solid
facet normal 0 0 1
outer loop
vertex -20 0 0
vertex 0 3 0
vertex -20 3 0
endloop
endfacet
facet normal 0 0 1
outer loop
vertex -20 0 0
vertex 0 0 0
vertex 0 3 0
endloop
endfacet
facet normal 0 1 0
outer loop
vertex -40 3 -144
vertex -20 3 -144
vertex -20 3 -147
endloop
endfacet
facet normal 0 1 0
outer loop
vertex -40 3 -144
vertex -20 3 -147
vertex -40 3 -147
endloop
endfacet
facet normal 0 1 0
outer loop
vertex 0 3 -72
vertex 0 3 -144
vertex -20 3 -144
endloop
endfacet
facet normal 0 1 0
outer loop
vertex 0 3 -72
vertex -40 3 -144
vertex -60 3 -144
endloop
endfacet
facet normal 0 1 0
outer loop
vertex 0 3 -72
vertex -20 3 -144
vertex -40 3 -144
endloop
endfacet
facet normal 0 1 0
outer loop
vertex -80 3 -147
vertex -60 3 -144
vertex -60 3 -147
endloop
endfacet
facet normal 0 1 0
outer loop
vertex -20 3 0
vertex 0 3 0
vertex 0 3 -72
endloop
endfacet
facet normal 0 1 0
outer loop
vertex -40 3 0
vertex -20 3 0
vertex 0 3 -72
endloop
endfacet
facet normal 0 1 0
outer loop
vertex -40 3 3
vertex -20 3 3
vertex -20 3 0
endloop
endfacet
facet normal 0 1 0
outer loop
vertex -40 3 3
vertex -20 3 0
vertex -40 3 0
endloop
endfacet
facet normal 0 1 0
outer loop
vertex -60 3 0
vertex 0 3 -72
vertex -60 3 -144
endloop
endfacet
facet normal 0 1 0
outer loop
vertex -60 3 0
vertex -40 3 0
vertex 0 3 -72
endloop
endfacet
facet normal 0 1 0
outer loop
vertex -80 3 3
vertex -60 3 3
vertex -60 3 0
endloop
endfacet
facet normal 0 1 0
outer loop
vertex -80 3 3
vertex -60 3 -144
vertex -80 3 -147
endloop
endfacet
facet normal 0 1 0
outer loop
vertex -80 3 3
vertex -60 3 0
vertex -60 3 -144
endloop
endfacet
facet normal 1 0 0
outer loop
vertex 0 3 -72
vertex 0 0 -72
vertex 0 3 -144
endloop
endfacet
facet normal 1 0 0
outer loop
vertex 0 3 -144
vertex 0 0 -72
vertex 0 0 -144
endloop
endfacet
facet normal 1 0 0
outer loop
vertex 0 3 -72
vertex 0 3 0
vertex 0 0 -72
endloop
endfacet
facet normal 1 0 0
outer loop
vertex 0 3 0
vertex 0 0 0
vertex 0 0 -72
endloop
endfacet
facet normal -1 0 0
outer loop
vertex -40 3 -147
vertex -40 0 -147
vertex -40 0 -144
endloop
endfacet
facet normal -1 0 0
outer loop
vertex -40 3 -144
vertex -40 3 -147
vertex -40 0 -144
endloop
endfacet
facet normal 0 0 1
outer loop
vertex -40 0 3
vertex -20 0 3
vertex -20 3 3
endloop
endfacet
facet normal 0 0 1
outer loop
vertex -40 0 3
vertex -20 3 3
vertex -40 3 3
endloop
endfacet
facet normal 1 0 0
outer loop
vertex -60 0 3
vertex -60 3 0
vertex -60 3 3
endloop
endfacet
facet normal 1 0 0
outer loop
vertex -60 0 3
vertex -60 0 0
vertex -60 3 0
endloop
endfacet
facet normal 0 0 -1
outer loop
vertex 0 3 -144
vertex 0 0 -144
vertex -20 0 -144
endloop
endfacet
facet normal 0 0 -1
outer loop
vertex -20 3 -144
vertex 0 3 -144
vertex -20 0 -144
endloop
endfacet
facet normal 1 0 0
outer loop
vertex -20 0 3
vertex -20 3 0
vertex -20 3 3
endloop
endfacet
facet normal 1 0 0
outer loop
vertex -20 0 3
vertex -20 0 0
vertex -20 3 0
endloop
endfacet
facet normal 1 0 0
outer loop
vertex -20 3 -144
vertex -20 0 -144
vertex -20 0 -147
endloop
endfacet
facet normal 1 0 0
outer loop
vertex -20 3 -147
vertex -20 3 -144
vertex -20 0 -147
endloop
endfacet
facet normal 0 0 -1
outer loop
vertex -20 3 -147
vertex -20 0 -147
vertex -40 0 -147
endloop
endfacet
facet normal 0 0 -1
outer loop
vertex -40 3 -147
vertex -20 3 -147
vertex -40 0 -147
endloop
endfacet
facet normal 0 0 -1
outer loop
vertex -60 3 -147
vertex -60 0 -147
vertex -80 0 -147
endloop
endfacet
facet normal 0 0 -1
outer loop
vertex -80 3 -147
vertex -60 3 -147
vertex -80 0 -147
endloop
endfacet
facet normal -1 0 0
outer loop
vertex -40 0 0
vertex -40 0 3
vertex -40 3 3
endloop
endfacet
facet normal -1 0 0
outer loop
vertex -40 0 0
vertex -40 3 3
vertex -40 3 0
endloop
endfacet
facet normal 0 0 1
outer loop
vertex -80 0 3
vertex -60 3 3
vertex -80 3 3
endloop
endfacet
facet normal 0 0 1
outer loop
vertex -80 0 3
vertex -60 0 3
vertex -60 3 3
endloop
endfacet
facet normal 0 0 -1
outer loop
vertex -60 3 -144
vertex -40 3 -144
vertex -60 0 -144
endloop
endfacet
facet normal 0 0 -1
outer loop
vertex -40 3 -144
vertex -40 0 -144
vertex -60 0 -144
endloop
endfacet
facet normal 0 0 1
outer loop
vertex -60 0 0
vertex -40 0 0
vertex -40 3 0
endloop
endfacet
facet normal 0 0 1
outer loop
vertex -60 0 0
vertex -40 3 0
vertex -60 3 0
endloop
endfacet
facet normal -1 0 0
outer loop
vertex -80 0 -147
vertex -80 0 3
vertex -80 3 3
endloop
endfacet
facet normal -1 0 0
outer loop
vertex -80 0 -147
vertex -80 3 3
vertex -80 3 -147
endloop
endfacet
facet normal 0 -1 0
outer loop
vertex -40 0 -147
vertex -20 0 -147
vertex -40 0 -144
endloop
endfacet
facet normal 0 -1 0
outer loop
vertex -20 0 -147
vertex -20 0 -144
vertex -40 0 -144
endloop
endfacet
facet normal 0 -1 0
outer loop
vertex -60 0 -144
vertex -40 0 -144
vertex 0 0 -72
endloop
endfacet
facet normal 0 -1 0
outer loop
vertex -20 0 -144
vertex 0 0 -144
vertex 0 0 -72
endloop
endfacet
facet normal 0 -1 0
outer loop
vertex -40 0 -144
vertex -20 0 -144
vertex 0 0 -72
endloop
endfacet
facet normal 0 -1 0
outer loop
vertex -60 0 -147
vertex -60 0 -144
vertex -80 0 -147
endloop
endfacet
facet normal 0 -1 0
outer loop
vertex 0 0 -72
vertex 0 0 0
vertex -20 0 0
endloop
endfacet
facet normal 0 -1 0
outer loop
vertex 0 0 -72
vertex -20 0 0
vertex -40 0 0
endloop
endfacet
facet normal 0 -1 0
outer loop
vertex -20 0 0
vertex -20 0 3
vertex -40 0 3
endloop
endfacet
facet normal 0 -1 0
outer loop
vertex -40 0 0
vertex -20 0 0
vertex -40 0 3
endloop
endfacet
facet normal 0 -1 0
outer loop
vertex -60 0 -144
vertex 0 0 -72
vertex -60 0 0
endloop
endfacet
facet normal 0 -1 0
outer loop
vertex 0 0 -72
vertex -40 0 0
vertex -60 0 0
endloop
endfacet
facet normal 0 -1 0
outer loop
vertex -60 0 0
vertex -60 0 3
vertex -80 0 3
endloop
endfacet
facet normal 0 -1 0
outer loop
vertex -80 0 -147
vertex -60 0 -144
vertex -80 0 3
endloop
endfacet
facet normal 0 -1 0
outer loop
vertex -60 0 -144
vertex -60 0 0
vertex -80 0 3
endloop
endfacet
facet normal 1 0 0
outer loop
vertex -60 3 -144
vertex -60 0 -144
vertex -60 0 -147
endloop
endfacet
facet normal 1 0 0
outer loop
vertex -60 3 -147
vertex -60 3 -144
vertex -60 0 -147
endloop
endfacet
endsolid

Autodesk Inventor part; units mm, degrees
ref_plane "YZ Plane" through (0, 0, 0) normal (1, 0, 0) x (0, 1, 0)
ref_plane "XZ Plane" through (0, 0, 0) normal (0, 1, 0) x (-1, 0, 0)
ref_plane "XY Plane" through (0, 0, 0) normal (0, 0, 1) x (1, 0, 0)
sketch "Sketch1" plane through (0, 0, 0) normal (0, 1, 0) x (-1, 0, 0)
  line L0 (0, 0) -> (0, -144)
  line L1 (0, 0) -> (20, 0)
  line L2 (20, 0) -> (20, 3)
  line L3 (20, 3) -> (40, 3)
  line L4 (40, 3) -> (40, 0)
  line L5 (40, 0) -> (60, 0)
  line L6 (60, 0) -> (60, 3)
  line L7 (60, 3) -> (80, 3)
  line L8 (0, -72) -> (20, -72)
  line L9 (0, -144) -> (20, -144)
  line L10 (20, -144) -> (20, -147)
  line L11 (20, -147) -> (40, -147)
  line L12 (40, -147) -> (40, -144)
  line L13 (40, -144) -> (60, -144)
  line L14 (60, -144) -> (60, -147)
  line L15 (60, -147) -> (80, -147)
  line L16 (80, 3) -> (80, -147)
  dimension "d0" = 144
  dimension "d1" = 20
  dimension "d2" = 3
  dimension "d3" = 20
  dimension "d4" = 20
  dimension "d5" = 20
  dimension "d6" = 20
extrude "Extrusion1" add sketch "Sketch1" along normal blind 3
properties part number "base prt 2 N" material "ABS Plastic"
